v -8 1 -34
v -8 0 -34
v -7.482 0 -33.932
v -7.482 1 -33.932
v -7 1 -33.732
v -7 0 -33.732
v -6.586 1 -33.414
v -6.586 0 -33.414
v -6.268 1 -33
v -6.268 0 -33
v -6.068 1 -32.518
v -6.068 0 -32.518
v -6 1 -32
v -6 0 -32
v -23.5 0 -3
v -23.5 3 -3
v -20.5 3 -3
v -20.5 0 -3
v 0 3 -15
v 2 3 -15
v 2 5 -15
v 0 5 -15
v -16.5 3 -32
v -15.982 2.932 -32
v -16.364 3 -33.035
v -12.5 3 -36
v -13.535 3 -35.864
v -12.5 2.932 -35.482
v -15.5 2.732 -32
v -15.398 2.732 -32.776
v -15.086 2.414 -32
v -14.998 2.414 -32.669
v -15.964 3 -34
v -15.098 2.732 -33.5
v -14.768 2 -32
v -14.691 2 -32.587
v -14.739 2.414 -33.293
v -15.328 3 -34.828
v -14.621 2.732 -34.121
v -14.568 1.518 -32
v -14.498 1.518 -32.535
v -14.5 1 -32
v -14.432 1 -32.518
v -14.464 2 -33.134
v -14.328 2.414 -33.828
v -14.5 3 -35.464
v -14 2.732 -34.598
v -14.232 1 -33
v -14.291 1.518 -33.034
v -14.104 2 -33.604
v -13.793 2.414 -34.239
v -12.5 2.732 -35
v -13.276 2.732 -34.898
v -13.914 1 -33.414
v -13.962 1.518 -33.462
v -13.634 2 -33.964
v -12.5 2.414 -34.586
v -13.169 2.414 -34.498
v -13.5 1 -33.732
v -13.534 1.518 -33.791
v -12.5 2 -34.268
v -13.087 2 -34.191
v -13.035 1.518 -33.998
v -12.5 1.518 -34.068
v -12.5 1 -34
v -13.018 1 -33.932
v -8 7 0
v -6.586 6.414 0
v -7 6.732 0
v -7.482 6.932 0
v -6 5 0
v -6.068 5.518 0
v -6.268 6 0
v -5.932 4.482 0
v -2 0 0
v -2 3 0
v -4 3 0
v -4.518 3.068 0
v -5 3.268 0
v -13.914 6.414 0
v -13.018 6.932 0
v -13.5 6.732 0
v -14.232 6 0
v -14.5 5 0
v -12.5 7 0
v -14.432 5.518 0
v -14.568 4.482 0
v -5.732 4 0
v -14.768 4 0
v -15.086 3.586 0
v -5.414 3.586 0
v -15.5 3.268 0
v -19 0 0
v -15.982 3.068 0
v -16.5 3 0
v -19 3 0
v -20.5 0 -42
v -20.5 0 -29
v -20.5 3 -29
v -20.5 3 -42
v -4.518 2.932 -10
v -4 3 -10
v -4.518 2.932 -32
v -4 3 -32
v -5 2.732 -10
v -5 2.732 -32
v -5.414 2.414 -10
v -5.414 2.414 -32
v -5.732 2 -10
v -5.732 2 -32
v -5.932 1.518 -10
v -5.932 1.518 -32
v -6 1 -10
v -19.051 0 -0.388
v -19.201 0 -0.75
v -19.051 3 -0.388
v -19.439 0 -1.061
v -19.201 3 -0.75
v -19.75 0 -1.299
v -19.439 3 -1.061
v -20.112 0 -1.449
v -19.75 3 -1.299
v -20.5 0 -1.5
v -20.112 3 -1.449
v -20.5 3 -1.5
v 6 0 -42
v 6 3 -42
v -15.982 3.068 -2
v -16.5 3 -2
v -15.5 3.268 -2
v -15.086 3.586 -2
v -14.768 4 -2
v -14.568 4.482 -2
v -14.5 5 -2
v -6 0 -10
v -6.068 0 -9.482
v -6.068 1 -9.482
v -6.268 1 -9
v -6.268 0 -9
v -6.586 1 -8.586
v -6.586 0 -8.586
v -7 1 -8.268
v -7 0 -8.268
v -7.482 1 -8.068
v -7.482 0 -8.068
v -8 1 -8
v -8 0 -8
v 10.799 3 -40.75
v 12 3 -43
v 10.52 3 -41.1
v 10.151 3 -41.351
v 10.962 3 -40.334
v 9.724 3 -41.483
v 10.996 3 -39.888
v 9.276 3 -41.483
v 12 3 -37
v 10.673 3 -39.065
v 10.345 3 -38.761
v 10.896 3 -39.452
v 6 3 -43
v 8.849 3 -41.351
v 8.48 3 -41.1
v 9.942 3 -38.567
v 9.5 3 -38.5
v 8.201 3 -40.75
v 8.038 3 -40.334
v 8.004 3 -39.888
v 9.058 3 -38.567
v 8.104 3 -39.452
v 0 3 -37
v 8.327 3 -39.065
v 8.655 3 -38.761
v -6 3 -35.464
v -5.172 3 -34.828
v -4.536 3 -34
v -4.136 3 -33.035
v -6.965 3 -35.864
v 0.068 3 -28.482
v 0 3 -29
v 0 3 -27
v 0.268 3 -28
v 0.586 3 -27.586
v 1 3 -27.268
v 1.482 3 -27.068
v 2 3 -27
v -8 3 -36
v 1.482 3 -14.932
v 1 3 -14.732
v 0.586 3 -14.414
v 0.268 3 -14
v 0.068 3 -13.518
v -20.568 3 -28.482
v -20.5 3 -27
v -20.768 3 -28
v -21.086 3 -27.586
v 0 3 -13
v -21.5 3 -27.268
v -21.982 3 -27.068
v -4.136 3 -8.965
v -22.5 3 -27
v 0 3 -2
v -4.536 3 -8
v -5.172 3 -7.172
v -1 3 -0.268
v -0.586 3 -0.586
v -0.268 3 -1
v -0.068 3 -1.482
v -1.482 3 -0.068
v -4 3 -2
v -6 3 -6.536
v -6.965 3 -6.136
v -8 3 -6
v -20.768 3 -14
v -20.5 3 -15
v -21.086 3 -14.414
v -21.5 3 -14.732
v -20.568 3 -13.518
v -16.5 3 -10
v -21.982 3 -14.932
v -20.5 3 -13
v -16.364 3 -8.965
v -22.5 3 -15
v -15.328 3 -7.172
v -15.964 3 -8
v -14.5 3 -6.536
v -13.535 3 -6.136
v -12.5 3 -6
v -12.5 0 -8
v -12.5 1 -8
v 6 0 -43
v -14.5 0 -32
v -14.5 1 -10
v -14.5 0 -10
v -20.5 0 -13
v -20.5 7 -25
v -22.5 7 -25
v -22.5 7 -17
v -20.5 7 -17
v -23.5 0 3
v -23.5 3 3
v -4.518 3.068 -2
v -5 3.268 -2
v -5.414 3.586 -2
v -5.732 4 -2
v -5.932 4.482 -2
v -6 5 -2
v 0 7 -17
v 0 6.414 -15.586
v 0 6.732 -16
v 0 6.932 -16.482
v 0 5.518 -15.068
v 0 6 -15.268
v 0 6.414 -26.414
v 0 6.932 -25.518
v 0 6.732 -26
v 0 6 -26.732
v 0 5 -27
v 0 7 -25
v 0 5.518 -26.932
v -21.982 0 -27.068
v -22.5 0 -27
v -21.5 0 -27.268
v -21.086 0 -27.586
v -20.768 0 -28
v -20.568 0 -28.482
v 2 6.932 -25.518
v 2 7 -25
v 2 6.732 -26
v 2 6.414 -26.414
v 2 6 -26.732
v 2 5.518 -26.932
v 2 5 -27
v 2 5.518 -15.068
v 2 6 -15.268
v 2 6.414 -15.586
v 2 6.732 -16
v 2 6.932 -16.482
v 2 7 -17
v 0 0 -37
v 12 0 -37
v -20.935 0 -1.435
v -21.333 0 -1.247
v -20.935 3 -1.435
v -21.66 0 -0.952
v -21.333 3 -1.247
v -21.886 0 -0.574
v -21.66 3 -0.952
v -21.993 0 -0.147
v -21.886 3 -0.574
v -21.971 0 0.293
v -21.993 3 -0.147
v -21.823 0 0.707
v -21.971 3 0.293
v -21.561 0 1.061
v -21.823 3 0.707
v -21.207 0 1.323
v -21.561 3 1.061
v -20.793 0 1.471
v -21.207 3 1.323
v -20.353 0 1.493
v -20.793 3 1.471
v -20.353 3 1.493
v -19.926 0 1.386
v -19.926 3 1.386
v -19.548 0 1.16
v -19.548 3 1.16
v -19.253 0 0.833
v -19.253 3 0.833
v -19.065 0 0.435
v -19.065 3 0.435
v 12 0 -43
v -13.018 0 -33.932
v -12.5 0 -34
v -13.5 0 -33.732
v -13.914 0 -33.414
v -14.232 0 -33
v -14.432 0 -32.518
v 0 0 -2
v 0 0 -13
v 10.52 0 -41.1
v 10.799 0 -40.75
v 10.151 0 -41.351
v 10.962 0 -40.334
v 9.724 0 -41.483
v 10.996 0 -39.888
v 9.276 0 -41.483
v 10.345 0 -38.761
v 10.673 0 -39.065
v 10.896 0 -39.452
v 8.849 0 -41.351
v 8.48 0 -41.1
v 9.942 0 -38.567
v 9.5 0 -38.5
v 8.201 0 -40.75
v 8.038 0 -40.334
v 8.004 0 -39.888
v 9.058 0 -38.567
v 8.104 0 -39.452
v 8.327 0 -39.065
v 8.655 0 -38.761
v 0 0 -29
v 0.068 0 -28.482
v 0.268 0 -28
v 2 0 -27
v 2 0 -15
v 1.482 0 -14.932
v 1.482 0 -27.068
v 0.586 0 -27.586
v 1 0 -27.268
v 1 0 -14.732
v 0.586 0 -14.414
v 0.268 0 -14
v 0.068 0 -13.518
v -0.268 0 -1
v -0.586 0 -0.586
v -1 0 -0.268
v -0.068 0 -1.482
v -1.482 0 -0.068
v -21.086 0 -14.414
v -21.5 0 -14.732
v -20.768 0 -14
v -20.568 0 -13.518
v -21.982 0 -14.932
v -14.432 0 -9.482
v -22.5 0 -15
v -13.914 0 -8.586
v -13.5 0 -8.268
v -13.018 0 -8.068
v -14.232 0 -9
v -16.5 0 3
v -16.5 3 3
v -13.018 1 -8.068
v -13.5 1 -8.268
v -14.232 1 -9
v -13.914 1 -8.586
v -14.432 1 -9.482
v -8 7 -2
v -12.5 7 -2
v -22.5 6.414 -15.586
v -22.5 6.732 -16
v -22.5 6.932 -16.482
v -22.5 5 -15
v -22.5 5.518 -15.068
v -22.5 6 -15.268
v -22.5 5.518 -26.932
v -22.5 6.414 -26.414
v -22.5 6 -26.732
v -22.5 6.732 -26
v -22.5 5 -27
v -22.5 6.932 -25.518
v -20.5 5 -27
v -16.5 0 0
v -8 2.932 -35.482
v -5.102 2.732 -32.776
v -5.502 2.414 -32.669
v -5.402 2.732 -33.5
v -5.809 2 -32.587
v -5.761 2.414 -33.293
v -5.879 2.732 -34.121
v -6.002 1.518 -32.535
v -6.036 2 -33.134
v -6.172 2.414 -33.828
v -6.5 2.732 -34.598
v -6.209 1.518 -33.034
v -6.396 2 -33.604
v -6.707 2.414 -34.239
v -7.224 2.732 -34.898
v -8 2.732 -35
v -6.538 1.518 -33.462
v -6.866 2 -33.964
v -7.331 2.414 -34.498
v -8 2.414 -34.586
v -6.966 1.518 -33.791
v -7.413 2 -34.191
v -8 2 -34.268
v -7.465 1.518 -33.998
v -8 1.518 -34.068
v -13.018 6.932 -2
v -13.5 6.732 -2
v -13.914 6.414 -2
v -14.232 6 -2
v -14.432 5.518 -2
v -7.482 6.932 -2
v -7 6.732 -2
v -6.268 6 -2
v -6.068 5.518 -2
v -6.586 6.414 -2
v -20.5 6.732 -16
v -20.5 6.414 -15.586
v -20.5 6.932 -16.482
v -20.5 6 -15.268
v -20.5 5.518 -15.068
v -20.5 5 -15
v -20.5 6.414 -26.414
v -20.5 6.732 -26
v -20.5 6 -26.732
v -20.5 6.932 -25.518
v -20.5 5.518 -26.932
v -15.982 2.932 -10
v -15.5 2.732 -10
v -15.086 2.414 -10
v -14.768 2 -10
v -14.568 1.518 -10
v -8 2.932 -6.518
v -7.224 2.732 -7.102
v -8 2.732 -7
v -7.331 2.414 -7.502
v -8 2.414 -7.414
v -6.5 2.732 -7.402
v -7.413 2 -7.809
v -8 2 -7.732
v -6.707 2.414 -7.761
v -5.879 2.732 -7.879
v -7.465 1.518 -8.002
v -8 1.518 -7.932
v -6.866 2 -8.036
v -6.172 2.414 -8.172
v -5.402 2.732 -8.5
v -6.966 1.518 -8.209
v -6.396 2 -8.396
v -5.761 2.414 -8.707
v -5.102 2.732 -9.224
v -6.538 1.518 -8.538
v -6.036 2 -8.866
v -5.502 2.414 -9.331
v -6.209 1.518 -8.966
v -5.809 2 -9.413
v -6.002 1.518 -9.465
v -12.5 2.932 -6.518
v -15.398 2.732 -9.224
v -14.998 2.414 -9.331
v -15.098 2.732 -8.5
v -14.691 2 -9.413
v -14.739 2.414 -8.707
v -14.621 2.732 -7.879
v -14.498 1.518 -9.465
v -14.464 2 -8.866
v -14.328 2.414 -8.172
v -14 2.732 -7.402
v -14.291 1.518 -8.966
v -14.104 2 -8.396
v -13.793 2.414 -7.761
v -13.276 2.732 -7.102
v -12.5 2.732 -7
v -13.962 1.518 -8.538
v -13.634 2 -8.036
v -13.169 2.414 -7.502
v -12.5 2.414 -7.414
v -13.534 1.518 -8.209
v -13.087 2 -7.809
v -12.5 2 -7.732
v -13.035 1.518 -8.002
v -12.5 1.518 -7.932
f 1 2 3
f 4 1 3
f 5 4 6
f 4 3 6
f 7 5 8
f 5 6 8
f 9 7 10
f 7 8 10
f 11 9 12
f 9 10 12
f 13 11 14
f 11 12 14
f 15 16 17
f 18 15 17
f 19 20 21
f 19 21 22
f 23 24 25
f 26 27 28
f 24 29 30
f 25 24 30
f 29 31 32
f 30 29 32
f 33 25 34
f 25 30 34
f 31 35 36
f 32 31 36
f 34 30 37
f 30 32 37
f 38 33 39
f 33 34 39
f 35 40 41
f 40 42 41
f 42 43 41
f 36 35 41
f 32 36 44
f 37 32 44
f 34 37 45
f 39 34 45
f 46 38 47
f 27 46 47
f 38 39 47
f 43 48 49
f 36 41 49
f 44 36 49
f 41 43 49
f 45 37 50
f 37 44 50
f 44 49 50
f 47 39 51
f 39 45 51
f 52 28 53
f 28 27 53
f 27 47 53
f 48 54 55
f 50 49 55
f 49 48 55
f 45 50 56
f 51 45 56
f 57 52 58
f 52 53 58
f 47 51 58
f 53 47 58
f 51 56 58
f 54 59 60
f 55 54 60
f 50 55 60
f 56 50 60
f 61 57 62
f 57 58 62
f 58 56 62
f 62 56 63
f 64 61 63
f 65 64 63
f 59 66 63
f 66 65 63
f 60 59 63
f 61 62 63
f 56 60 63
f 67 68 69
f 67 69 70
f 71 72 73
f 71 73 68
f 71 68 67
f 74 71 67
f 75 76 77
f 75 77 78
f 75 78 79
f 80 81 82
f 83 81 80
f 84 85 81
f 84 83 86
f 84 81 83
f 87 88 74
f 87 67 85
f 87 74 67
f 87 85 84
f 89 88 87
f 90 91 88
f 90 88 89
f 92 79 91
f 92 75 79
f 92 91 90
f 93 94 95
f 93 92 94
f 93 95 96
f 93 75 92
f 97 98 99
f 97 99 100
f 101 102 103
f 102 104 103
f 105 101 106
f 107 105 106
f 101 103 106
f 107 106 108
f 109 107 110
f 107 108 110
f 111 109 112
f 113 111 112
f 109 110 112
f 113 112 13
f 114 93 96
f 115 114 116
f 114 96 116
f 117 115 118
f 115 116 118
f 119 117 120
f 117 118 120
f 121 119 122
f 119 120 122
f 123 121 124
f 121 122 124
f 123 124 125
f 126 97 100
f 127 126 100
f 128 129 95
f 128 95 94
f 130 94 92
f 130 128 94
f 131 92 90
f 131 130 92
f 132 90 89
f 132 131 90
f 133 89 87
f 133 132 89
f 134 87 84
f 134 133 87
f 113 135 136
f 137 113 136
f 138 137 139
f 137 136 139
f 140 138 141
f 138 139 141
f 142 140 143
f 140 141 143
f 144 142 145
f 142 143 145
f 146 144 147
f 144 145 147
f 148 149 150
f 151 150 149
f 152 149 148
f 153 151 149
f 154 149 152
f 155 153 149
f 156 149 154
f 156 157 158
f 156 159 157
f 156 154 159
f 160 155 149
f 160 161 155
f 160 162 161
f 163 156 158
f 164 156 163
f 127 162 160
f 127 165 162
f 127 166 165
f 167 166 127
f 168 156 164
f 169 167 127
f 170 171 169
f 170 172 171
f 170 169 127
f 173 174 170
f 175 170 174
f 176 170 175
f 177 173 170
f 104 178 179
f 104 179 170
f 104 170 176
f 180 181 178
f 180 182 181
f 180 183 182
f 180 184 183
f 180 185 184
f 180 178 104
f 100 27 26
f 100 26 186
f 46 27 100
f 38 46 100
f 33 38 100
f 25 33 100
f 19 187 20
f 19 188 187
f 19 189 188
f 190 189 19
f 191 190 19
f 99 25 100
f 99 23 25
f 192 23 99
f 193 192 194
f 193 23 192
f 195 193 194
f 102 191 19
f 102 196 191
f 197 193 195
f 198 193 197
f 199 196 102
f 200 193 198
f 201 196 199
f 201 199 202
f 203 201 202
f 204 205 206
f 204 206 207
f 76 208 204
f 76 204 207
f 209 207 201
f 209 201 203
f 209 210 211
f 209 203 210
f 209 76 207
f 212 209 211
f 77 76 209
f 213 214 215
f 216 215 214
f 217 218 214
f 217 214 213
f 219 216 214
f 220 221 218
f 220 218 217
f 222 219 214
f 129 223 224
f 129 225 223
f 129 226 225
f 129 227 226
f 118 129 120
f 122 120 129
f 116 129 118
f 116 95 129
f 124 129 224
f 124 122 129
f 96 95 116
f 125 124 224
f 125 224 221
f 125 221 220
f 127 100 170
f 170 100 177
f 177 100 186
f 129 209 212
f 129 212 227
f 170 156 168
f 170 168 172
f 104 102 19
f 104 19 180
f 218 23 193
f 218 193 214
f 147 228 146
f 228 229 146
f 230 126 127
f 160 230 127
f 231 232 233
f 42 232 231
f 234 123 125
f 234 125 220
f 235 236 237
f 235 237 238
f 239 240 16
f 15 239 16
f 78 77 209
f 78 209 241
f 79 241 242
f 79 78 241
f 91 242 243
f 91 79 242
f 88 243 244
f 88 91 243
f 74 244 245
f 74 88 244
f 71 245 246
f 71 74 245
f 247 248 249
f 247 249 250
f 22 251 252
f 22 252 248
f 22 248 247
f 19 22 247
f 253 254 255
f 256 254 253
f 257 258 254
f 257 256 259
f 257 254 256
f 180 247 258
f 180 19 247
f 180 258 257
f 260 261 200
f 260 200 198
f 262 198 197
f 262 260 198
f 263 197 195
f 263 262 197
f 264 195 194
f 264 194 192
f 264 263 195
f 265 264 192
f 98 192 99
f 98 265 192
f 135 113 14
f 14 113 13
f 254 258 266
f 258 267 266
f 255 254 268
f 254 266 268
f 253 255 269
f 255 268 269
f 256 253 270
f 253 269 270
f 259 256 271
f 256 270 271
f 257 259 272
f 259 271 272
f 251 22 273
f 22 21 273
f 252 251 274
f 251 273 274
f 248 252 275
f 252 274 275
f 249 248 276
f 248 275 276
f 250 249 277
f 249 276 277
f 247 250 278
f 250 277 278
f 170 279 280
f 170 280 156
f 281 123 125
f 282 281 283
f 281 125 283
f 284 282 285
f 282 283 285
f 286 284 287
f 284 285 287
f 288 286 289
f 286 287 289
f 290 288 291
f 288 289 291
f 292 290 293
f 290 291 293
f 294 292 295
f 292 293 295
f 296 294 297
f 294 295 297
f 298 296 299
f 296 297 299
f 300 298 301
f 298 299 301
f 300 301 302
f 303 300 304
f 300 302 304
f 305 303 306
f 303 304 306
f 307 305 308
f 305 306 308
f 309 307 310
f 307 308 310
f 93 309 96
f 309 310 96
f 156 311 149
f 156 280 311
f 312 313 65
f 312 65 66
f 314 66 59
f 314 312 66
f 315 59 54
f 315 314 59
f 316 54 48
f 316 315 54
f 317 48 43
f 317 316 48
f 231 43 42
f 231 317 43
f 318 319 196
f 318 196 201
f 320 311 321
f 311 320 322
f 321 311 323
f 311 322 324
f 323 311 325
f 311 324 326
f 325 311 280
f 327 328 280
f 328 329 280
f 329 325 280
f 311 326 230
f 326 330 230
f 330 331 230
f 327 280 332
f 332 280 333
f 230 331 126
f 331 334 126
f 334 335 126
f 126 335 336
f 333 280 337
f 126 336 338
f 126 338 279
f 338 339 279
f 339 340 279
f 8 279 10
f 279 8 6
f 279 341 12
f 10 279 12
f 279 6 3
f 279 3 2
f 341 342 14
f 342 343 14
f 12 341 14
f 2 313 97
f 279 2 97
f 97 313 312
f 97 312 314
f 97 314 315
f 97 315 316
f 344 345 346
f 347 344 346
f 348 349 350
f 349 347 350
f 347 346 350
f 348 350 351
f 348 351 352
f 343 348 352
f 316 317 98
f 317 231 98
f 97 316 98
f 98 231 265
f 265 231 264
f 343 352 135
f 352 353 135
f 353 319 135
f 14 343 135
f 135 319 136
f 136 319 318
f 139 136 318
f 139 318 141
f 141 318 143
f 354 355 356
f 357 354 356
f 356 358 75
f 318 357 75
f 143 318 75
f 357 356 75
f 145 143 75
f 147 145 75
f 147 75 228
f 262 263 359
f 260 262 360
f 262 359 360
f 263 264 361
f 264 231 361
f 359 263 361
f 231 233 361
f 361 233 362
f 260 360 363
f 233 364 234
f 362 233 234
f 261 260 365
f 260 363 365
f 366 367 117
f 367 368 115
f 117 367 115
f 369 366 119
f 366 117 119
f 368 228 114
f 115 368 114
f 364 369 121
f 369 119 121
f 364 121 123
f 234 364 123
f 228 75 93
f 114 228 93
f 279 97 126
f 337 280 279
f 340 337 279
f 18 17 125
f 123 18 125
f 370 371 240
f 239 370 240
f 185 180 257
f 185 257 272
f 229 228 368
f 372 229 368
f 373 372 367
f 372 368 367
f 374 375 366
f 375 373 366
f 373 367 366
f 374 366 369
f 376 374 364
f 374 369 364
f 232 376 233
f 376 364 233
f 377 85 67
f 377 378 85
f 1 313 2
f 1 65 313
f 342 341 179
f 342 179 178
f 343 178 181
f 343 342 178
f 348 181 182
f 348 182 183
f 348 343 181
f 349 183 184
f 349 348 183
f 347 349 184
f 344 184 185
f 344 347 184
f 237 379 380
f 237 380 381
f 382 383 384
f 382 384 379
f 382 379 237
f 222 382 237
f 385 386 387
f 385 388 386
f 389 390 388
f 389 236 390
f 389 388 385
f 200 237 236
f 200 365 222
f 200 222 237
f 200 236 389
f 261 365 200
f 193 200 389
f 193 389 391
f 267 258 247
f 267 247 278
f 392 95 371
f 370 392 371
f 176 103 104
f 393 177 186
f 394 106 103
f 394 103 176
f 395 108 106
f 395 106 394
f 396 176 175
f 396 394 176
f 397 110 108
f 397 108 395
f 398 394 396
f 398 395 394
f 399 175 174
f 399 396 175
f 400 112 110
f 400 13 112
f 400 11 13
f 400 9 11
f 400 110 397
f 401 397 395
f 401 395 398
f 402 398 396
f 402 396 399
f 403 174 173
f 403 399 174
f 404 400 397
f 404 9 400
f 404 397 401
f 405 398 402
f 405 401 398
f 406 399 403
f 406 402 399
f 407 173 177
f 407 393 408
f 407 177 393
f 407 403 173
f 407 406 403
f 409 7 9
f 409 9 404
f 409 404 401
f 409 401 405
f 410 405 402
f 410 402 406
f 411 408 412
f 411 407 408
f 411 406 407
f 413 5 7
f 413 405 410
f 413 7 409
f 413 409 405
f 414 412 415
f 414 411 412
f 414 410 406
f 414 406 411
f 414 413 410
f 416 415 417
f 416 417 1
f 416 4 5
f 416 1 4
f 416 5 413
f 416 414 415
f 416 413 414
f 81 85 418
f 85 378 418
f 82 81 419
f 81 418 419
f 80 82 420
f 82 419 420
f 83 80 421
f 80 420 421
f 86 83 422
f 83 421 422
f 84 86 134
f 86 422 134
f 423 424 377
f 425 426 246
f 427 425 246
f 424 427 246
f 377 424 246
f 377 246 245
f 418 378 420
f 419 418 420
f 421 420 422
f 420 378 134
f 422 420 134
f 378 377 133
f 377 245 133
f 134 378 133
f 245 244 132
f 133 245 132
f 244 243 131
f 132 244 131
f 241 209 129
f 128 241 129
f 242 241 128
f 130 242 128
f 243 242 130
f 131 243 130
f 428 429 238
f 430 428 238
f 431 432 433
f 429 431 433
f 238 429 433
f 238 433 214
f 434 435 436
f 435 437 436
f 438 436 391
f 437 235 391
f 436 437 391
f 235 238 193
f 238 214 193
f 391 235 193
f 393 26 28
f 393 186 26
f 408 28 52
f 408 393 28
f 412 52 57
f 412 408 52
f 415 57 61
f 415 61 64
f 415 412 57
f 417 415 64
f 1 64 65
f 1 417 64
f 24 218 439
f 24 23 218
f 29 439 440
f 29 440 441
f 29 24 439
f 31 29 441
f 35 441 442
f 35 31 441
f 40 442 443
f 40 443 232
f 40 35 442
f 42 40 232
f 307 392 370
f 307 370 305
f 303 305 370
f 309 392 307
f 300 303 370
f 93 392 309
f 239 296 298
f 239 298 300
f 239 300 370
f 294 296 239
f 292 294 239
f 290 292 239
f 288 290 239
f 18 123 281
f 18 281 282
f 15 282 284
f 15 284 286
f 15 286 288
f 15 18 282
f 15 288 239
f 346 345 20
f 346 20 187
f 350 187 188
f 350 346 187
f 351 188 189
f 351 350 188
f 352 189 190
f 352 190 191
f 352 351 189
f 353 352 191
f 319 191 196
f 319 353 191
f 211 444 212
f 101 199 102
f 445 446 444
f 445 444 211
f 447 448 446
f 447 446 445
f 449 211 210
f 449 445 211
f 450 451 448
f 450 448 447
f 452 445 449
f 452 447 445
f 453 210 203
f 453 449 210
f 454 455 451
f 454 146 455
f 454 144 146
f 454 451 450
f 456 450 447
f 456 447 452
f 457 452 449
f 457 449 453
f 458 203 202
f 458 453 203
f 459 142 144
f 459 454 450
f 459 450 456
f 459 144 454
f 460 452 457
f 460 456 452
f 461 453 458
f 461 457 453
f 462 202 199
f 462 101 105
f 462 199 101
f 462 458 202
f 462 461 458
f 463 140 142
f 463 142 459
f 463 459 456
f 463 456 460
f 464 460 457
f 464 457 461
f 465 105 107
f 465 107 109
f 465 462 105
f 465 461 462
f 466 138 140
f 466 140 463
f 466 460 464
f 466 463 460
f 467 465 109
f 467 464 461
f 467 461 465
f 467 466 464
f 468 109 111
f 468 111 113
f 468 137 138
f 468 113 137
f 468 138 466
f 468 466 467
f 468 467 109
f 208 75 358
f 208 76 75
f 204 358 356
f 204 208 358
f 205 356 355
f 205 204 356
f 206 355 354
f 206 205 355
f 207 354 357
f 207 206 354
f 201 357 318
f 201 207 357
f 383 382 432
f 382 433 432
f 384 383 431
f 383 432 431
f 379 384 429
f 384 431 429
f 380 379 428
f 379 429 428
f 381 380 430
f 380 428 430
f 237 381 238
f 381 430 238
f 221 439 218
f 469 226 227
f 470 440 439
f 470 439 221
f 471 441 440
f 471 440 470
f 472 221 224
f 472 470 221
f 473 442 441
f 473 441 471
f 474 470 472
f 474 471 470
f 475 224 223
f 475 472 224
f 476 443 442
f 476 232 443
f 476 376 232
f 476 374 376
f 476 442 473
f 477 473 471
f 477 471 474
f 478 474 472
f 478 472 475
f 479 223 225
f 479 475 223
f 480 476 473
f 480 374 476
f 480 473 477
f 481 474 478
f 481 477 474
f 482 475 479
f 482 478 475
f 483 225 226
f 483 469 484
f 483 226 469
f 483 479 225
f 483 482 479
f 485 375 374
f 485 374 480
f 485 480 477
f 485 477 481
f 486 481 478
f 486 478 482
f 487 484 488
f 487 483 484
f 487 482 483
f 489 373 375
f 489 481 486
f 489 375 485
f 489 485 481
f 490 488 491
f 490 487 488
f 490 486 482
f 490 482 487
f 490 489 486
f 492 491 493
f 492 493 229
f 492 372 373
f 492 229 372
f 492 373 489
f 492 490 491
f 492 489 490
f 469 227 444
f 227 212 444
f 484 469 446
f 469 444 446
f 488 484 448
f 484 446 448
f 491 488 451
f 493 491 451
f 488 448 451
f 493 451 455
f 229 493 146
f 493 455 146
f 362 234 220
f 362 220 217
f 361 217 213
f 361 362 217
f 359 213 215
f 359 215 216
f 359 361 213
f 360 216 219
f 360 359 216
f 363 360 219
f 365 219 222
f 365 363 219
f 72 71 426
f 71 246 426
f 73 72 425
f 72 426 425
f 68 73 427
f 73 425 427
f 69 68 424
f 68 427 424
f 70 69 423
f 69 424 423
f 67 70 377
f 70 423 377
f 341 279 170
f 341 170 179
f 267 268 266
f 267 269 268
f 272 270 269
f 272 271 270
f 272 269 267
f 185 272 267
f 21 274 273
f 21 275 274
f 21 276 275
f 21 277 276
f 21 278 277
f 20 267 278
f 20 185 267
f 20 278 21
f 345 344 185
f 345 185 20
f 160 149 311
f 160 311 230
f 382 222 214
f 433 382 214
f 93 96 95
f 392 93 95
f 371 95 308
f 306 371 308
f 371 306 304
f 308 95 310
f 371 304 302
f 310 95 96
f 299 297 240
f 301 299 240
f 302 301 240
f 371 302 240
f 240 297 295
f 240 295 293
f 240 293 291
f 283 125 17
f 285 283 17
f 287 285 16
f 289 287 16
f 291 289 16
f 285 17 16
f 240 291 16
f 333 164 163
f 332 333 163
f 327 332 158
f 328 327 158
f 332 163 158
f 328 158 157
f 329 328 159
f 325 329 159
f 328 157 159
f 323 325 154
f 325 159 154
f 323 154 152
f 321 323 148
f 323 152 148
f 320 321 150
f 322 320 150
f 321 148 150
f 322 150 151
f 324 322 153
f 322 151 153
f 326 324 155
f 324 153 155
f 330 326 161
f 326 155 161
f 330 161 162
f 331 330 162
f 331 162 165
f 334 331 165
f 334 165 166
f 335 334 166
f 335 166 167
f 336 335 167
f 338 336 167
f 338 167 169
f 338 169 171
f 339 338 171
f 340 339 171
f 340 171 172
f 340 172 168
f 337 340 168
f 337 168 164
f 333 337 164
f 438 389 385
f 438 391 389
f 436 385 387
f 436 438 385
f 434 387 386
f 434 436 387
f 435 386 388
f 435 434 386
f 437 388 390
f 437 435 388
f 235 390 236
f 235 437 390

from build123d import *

# Parameters (mm, degrees)
EXTRUDE_1_DEPTH     = 3
SKETCH_3_W          = 8.5
SKETCH_3_H          = 2
EXTRUDE_2_DEPTH     = 4
SKETCH_4_W          = 2
SKETCH_4_H          = 12
EXTRUDE_3_DEPTH     = 4
FILLET_1_R          = 2
FILLET_2_R          = 2
FILLET_3_R          = 2
SKETCH_5_W          = 8.5
SKETCH_5_H          = 26
CUT_EXTRUDE_1_DEPTH = 4
FILLET_4_R          = 2
EXTRUDE_4_DEPTH     = 3
SKETCH_9_W          = 5
SKETCH_9_H          = 3
EXTRUDE_5_DEPTH     = 12
SKETCH_8_R          = 1.5
CUT_EXTRUDE_2_DEPTH = 12
SKETCH_10_W         = 6
SKETCH_10_H         = 3
EXTRUDE_6_DEPTH     = 1


with BuildPart() as part:
    # 草图1 → 凸台-拉伸1 (new body)
    with BuildSketch(Plane(origin=(0, 0, 0), x_dir=(1, 0, 0), z_dir=(0, 1, 0))):
        Polygon((0, 0), (-20.5, 0), (-20.5, 15), (-22.5, 15), (-22.5, 27), (-20.5, 27), (-20.5, 42), (0, 42), (0, 27), (2, 27), (2, 15), (0, 15), align=None)
    extrude(amount=EXTRUDE_1_DEPTH)

    # 草图3 → 凸台-拉伸2 (add)
    with BuildSketch(Plane(origin=(0, 3, 0), x_dir=(1, 0, 0), z_dir=(0, 1, 0))):
        with Locations((-10.25, 1)):
            Rectangle(SKETCH_3_W, SKETCH_3_H)
    extrude(amount=EXTRUDE_2_DEPTH)

    # 草图4 → 凸台-拉伸3 (add)
    with BuildSketch(Plane(origin=(0, 3, 0), x_dir=(1, 0, 0), z_dir=(0, 1, 0))):
        with Locations((-21.5, 21)):
            Rectangle(SKETCH_4_W, SKETCH_4_H)
        with Locations((1, 21)):
            Rectangle(SKETCH_4_W, SKETCH_4_H)
    extrude(amount=EXTRUDE_3_DEPTH)

    # 圆角1
    fillet_1_edges = [part.edges().sort_by_distance(p)[0] for p in [
        (-14.5, 7, -1),
        (-6, 7, -1),
        (-21.5, 7, -15),
        (-21.5, 7, -27),
        (1, 7, -15),
        (1, 7, -27),
    ]]
    fillet(fillet_1_edges, radius=FILLET_1_R)

    # 圆角2
    fillet_2_edges = [part.edges().sort_by_distance(p)[0] for p in [
        (0, 1.5, 0),
    ]]
    fillet(fillet_2_edges, radius=FILLET_2_R)

    # 圆角3
    # the kernel refuses this fillet: 2 mm, written as the material it adds along each edge
    with BuildSketch(Plane(origin=(-6, 3, 0), x_dir=(1, 0, 0), z_dir=(0, 0, -1)), Plane(origin=(-14.5, 3, -2), x_dir=(-1, 0, 0), z_dir=(0, 0, 1))) as fillet_3_piece_1:
        with BuildLine():
            CenterArc((FILLET_3_R, -FILLET_3_R), FILLET_3_R, 90, 90)
            Line((0, -FILLET_3_R), (0, 0))
            Line((0, 0), (FILLET_3_R, 0))
        make_face()
    extrude(amount=2)
    with BuildSketch(Plane(origin=(-20.5, 0, -15), x_dir=(0, 0, 1), z_dir=(0, 1, 0)), Plane(origin=(0, 0, -27), x_dir=(0, 0, -1), z_dir=(0, 1, 0))) as fillet_3_piece_2:
        with BuildLine():
            CenterArc((FILLET_3_R, -FILLET_3_R), FILLET_3_R, 90, 90)
            Line((0, -FILLET_3_R), (0, 0))
            Line((0, 0), (FILLET_3_R, 0))
        make_face()
    extrude(amount=3)
    with BuildSketch(Plane(origin=(-20.5, 0, -27), x_dir=(0, 0, -1), z_dir=(0, 1, 0)), Plane(origin=(0, 0, -15), x_dir=(0, 0, 1), z_dir=(0, 1, 0))) as fillet_3_piece_3:
        with BuildLine():
            CenterArc((FILLET_3_R, FILLET_3_R), FILLET_3_R, 180, 90)
            Line((0, FILLET_3_R), (0, 0))
            Line((0, 0), (FILLET_3_R, 0))
        make_face()
    extrude(amount=3)

    # 草图5 → 切除-拉伸1 (cut)
    with BuildSketch(Plane(origin=(0, 3, 0), x_dir=(1, 0, 0), z_dir=(0, 1, 0))):
        with Locations((-10.25, 21)):
            Rectangle(SKETCH_5_W, SKETCH_5_H)
    extrude(amount=-CUT_EXTRUDE_1_DEPTH, mode=Mode.SUBTRACT)

    # 圆角4
    fillet_4_edges = [part.edges().sort_by_distance(p)[0] for p in [
        (-14.5, 1.5, -8),
        (-14.5, 1.5, -34),
        (-6, 1.5, -34),
        (-6, 1.5, -8),
        (-14.5, 3, -21),
        (-10.25, 3, -8),
        (-6, 3, -21),
        (-10.25, 3, -34),
    ]]
    fillet(fillet_4_edges, radius=FILLET_4_R)

    # 草图9 → 凸台-拉伸5 (add)
    with BuildSketch(Plane(origin=(0, 0, 0), x_dir=(0, 0, -1), z_dir=(1, 0, 0))):
        with Locations((39.5, 1.5)):
            Rectangle(SKETCH_9_W, SKETCH_9_H)
    extrude(amount=EXTRUDE_5_DEPTH)


with BuildPart() as body_2:
    # 草图7 → 凸台-拉伸4 (new body)
    with BuildSketch(Plane(origin=(0, 3, 0), x_dir=(1, 0, 0), z_dir=(0, 1, 0))):
        Polygon((-16.5, 0), (-16.5, -3), (-23.5, -3), (-23.5, 3), (-20.5, 3), (-20.5, 0), align=None)
    extrude(amount=-EXTRUDE_4_DEPTH)


with BuildPart() as cut_extrude_2_tool:
    # 草图8 → 切除-拉伸2 (new body)
    with BuildSketch(Plane(origin=(0, 3, 0), x_dir=(1, 0, 0), z_dir=(0, 1, 0))):
        with Locations((-20.5, 0)):
            Circle(SKETCH_8_R)
        with Locations(Location((9.5, 40, 0), (0, 0, 270))):
            Circle(SKETCH_8_R)
    extrude(amount=-CUT_EXTRUDE_2_DEPTH)


with BuildPart() as part_1:
    add(part.part)

    # 切除-拉伸2: cut by cut_extrude_2_tool
    add(cut_extrude_2_tool.part, mode=Mode.SUBTRACT)

    # 草图10 → 凸台-拉伸6 (add)
    with BuildSketch(Plane(origin=(0, 0, -42), x_dir=(-1, 0, 0), z_dir=(0, 0, -1))):
        with Locations((-9, 1.5)):
            Rectangle(SKETCH_10_W, SKETCH_10_H)
    extrude(amount=EXTRUDE_6_DEPTH)


with BuildPart() as body_2_1:
    add(body_2.part)

    # 切除-拉伸2: cut by cut_extrude_2_tool
    add(cut_extrude_2_tool.part, mode=Mode.SUBTRACT)


solid = Compound([part_1.part, body_2_1.part])
